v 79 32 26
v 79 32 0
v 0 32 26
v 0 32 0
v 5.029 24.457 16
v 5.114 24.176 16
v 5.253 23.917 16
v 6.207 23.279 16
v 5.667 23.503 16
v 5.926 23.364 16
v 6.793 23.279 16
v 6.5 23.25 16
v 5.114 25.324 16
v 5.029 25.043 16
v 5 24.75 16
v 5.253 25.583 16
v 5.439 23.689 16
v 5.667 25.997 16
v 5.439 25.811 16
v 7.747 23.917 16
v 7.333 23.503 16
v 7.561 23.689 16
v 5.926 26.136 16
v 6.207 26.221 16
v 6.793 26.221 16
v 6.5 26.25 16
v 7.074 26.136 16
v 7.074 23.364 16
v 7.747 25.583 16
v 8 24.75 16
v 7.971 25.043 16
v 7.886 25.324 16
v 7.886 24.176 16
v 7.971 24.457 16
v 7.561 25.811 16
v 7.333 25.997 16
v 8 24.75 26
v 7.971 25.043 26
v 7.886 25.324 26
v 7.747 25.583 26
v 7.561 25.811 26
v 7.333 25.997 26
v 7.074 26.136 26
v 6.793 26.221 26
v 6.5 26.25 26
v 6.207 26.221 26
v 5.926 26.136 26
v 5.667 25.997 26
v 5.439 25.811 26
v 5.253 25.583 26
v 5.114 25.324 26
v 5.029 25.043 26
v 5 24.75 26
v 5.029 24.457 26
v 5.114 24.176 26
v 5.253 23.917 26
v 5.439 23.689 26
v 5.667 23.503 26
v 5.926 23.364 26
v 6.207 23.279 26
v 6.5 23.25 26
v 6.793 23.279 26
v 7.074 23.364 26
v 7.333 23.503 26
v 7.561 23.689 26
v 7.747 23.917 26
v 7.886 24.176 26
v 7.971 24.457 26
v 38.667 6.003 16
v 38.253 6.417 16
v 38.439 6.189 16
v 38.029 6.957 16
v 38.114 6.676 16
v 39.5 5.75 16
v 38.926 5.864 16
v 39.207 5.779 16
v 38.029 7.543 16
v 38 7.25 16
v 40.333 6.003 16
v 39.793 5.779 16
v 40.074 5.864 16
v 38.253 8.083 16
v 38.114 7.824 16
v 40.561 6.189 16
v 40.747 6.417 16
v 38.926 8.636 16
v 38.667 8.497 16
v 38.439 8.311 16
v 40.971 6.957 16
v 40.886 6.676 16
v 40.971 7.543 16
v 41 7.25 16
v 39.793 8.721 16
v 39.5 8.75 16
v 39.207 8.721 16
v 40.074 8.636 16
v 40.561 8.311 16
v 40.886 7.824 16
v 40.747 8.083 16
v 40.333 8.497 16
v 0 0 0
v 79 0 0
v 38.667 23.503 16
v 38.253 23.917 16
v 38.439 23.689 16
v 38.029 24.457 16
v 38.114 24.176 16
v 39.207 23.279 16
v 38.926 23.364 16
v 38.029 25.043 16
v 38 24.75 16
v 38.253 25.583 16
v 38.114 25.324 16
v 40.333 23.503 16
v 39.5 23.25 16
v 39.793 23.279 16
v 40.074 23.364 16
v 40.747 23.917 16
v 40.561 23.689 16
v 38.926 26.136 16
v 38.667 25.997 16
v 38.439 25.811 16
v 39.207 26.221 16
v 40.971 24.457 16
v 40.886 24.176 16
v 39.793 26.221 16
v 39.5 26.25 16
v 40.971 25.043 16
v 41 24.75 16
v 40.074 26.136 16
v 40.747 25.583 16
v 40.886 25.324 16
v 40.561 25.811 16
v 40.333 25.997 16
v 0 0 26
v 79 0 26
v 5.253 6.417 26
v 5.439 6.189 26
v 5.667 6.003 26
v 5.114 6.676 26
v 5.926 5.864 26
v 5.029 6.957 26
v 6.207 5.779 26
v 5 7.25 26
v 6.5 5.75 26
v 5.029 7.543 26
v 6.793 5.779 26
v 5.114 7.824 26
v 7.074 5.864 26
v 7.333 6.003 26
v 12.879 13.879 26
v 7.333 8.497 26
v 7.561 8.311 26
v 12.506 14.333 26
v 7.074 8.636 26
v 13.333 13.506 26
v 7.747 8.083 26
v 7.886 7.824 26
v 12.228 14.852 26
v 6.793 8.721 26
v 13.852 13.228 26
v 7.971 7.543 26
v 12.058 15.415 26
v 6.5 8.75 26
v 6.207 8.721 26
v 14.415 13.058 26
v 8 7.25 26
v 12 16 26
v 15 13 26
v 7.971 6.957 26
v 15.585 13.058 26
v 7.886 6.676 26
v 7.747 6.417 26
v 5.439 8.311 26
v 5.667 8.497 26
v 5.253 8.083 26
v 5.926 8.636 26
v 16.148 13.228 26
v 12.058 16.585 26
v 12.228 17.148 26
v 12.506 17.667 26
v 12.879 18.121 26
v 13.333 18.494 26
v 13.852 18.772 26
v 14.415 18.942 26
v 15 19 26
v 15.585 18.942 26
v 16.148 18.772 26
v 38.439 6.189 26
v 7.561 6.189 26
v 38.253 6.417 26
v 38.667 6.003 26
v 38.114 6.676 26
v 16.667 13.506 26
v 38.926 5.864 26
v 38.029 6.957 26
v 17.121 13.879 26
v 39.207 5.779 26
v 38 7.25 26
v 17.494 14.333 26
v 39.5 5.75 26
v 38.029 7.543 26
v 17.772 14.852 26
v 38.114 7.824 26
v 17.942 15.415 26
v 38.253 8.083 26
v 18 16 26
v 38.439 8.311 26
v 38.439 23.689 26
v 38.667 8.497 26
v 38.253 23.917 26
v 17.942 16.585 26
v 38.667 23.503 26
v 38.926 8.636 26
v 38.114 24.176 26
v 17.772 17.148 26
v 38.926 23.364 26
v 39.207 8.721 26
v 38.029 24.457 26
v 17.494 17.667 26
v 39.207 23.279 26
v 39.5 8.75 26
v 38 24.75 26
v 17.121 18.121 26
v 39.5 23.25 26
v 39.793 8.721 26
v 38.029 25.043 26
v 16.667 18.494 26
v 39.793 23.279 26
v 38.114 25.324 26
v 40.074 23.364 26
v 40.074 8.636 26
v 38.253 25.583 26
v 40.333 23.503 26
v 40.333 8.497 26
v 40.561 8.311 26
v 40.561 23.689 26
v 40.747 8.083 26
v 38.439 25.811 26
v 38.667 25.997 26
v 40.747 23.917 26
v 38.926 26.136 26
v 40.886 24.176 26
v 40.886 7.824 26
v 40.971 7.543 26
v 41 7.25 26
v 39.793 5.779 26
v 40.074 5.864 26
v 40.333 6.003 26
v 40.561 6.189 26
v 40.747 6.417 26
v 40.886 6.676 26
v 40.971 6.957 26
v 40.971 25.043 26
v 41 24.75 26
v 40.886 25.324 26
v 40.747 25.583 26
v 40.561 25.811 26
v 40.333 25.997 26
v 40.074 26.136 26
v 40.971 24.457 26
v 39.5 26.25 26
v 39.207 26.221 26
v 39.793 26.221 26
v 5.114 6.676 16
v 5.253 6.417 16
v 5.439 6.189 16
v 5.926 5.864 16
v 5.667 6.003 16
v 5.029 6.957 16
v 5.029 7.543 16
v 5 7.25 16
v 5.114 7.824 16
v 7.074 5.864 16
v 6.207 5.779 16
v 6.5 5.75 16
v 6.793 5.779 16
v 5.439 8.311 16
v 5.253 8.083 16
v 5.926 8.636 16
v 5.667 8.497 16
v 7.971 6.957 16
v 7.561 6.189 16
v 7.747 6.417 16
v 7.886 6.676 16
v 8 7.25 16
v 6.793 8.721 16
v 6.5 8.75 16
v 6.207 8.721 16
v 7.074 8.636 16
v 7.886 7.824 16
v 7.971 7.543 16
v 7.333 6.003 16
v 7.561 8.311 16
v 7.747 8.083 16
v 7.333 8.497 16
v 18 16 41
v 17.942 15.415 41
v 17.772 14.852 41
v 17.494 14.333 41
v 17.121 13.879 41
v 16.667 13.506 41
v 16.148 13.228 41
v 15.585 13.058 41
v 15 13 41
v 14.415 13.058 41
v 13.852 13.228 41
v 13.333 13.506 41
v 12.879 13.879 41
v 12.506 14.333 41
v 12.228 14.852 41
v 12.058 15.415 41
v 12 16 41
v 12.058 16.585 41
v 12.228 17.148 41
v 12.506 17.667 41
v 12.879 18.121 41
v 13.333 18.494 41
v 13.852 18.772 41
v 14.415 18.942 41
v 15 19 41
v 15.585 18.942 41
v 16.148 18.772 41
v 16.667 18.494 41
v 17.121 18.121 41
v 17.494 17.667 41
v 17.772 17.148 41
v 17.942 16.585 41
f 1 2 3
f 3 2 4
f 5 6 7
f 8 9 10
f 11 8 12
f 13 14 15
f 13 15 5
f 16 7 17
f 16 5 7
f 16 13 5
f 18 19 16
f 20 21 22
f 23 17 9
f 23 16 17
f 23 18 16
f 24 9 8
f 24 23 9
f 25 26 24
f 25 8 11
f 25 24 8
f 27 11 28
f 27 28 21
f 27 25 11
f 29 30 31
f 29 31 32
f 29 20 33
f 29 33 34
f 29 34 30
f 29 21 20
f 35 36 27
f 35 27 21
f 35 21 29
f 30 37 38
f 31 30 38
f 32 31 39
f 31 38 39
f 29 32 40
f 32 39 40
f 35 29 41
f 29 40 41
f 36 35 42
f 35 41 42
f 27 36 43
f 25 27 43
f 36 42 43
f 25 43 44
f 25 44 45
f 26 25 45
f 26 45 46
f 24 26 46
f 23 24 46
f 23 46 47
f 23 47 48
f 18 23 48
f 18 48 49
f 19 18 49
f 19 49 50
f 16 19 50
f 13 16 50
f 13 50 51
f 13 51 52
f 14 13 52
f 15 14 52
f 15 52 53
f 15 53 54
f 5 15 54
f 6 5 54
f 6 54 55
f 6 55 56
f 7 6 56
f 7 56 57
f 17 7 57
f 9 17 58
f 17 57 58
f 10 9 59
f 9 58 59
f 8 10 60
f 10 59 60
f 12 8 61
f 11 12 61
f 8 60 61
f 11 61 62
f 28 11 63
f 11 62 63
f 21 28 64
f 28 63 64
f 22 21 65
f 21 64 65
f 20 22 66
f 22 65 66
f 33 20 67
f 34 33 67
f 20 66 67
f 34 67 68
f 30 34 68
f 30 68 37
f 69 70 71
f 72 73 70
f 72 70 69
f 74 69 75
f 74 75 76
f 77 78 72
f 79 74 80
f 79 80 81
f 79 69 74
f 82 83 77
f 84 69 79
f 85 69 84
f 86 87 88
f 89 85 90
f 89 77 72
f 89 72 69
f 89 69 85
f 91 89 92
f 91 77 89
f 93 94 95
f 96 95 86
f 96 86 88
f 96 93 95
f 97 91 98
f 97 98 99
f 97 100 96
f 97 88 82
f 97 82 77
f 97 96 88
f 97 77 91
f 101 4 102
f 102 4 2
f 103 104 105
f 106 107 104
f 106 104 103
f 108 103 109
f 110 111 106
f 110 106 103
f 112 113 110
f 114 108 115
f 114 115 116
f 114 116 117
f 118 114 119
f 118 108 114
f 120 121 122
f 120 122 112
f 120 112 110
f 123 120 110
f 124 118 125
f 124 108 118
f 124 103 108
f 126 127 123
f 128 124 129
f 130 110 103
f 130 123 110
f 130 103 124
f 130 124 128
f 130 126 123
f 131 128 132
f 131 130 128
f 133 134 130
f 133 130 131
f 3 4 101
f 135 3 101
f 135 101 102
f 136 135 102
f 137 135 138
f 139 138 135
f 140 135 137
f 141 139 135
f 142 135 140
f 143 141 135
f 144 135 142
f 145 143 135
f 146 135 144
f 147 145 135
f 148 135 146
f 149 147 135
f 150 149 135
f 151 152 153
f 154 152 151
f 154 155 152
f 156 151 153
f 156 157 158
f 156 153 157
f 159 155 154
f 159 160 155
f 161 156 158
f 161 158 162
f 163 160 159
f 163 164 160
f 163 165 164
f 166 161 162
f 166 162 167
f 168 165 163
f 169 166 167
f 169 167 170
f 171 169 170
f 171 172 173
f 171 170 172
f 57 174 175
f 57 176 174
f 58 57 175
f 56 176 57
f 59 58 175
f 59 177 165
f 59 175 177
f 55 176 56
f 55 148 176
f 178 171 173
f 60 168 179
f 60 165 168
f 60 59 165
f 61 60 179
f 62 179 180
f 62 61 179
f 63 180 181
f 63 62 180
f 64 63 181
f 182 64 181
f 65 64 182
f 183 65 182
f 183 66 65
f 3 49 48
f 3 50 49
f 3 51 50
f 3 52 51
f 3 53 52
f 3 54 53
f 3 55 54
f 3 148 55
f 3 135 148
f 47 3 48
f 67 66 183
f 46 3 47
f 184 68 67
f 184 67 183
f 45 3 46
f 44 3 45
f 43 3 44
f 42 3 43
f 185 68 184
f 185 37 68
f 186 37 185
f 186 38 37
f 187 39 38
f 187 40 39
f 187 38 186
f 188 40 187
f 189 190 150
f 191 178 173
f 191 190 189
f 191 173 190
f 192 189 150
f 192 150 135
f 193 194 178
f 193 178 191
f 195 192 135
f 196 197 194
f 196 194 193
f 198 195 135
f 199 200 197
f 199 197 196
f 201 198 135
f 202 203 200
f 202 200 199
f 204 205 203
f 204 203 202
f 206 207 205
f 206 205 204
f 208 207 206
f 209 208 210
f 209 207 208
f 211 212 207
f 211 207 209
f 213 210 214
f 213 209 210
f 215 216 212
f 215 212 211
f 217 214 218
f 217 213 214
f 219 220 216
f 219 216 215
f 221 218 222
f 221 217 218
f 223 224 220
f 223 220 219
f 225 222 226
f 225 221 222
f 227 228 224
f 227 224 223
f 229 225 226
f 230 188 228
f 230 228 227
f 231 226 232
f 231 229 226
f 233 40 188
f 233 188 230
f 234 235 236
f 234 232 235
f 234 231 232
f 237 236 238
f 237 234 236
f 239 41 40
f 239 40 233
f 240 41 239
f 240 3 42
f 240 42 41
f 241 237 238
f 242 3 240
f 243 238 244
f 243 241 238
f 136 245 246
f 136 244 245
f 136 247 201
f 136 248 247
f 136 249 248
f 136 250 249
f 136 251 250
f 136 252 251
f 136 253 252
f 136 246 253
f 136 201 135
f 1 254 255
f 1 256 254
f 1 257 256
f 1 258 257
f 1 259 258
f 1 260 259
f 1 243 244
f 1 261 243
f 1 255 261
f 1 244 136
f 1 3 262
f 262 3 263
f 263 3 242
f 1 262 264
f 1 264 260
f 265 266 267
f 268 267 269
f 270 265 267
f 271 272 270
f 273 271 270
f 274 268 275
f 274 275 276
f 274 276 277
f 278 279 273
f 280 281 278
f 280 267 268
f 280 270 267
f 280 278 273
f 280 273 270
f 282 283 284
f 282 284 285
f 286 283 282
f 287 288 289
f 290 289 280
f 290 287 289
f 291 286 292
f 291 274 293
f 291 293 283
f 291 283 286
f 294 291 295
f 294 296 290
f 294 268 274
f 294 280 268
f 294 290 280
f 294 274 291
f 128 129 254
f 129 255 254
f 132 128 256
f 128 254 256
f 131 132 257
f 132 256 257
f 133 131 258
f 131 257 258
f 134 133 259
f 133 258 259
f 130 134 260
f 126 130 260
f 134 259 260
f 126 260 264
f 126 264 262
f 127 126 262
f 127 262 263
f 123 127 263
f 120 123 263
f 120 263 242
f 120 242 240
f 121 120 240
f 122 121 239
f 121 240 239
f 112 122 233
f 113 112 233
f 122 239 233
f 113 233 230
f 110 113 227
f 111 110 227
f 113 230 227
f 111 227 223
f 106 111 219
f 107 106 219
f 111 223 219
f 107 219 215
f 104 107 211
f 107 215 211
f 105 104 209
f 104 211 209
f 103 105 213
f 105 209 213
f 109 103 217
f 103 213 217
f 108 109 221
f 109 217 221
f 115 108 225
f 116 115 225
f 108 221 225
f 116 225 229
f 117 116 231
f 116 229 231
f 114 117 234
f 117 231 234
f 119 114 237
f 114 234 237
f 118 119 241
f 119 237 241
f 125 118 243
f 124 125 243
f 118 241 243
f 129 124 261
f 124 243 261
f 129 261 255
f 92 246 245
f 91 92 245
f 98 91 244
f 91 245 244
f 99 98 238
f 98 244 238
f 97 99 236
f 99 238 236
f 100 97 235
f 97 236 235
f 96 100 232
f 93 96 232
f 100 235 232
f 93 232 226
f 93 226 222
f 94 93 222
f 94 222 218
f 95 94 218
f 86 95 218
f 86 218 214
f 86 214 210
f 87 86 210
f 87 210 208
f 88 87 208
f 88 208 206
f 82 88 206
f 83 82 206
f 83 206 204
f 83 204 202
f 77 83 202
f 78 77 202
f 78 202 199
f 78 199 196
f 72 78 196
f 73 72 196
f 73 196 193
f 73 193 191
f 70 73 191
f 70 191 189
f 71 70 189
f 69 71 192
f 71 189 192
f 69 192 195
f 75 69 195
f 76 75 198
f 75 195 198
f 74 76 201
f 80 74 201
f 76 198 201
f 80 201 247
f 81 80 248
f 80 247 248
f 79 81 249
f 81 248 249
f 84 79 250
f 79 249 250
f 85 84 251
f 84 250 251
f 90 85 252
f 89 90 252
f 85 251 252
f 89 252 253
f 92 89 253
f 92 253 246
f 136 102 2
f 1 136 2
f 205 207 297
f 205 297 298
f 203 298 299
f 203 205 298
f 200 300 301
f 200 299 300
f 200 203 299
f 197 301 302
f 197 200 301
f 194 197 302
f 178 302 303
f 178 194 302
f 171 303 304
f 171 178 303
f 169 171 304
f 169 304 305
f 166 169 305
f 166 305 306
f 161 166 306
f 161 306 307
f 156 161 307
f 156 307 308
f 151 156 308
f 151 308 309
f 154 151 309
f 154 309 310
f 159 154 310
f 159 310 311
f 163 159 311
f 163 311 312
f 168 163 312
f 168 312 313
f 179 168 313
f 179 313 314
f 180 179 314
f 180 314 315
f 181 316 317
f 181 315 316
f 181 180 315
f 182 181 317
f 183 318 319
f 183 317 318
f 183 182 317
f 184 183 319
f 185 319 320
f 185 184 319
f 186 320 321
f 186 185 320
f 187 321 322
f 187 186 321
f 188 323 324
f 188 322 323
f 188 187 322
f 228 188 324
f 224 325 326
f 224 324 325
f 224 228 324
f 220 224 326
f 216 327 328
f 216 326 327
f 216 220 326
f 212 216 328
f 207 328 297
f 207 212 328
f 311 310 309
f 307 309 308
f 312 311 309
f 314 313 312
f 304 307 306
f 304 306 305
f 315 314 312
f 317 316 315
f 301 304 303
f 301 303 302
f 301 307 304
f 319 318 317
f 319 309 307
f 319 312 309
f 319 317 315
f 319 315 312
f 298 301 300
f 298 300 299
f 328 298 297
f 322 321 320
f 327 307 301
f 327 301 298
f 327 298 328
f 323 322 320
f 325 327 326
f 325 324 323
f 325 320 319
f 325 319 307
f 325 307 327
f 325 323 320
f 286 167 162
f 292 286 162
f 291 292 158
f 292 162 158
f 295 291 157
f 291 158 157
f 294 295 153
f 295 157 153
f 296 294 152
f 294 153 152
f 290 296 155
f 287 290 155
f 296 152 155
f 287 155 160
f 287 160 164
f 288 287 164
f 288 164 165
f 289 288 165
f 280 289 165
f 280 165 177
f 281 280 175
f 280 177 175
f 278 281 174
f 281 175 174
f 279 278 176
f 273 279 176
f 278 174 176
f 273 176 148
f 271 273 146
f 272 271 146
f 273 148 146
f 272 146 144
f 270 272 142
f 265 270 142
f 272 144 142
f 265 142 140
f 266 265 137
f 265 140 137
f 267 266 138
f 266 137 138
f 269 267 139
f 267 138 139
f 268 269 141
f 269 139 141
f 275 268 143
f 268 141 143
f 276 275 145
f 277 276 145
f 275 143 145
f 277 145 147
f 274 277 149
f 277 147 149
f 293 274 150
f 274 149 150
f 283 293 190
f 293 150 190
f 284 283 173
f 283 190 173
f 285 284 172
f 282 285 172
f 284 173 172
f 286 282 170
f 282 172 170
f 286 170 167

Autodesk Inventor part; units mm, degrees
ref_plane "YZ Plane" through (0, 0, 0) normal (1, 0, 0) x (0, 1, 0)
ref_plane "XZ Plane" through (0, 0, 0) normal (0, 1, 0) x (-1, 0, 0)
ref_plane "XY Plane" through (0, 0, 0) normal (0, 0, 1) x (1, 0, 0)
sketch "Sketch1" plane through (0, 0, 0) normal (0, 0, 1) x (1, 0, 0)
  line L0 (0, 0) -> (79, 0)
  line L1 (79, 0) -> (79, 32)
  line L2 (79, 32) -> (0, 32)
  line L3 (0, 32) -> (0, 0)
  dimension "d0" = 79
  dimension "d1" = 32
extrude "Extrusion1" add sketch "Sketch1" along normal blind 26
sketch "Sketch2" plane through (0, 0, 26) normal (0, 0, 1) x (1, 0, 0)
  circle A0 centre (15, 16) radius 3
  line L0 (0, 32) -> (0, 0) projected
  line L1 (6.5, 24.75) -> (39.5, 24.75) construction
  line L2 (39.5, 24.75) -> (39.5, 7.25) construction
  line L3 (39.5, 7.25) -> (6.5, 7.25) construction
  line L4 (6.5, 7.25) -> (6.5, 24.75) construction
  circle A1 centre (6.5, 24.75) radius 1.5
  circle A2 centre (6.5, 7.25) radius 1.5
  circle A3 centre (39.5, 24.75) radius 1.5
  circle A4 centre (39.5, 7.25) radius 1.5
  point P0 (0, 16)
  point P1 (6.5, 16)
  dimension "d4" = 6
  dimension "d5" = 15
  dimension "d6" = 33
  dimension "d7" = 17.5
  dimension "d8" = 8.5
  dimension "d9" = 3
  dimension "d10" = 3
  dimension "d11" = 3
  dimension "d12" = 3
extrude "Extrusion2" add sketch "Sketch2" along normal blind 15 contours A0
extrude "Extrusion3" cut sketch "Sketch2" against normal blind 10 contours A1 | A2 | A3 | A4
properties part number "Motor"
